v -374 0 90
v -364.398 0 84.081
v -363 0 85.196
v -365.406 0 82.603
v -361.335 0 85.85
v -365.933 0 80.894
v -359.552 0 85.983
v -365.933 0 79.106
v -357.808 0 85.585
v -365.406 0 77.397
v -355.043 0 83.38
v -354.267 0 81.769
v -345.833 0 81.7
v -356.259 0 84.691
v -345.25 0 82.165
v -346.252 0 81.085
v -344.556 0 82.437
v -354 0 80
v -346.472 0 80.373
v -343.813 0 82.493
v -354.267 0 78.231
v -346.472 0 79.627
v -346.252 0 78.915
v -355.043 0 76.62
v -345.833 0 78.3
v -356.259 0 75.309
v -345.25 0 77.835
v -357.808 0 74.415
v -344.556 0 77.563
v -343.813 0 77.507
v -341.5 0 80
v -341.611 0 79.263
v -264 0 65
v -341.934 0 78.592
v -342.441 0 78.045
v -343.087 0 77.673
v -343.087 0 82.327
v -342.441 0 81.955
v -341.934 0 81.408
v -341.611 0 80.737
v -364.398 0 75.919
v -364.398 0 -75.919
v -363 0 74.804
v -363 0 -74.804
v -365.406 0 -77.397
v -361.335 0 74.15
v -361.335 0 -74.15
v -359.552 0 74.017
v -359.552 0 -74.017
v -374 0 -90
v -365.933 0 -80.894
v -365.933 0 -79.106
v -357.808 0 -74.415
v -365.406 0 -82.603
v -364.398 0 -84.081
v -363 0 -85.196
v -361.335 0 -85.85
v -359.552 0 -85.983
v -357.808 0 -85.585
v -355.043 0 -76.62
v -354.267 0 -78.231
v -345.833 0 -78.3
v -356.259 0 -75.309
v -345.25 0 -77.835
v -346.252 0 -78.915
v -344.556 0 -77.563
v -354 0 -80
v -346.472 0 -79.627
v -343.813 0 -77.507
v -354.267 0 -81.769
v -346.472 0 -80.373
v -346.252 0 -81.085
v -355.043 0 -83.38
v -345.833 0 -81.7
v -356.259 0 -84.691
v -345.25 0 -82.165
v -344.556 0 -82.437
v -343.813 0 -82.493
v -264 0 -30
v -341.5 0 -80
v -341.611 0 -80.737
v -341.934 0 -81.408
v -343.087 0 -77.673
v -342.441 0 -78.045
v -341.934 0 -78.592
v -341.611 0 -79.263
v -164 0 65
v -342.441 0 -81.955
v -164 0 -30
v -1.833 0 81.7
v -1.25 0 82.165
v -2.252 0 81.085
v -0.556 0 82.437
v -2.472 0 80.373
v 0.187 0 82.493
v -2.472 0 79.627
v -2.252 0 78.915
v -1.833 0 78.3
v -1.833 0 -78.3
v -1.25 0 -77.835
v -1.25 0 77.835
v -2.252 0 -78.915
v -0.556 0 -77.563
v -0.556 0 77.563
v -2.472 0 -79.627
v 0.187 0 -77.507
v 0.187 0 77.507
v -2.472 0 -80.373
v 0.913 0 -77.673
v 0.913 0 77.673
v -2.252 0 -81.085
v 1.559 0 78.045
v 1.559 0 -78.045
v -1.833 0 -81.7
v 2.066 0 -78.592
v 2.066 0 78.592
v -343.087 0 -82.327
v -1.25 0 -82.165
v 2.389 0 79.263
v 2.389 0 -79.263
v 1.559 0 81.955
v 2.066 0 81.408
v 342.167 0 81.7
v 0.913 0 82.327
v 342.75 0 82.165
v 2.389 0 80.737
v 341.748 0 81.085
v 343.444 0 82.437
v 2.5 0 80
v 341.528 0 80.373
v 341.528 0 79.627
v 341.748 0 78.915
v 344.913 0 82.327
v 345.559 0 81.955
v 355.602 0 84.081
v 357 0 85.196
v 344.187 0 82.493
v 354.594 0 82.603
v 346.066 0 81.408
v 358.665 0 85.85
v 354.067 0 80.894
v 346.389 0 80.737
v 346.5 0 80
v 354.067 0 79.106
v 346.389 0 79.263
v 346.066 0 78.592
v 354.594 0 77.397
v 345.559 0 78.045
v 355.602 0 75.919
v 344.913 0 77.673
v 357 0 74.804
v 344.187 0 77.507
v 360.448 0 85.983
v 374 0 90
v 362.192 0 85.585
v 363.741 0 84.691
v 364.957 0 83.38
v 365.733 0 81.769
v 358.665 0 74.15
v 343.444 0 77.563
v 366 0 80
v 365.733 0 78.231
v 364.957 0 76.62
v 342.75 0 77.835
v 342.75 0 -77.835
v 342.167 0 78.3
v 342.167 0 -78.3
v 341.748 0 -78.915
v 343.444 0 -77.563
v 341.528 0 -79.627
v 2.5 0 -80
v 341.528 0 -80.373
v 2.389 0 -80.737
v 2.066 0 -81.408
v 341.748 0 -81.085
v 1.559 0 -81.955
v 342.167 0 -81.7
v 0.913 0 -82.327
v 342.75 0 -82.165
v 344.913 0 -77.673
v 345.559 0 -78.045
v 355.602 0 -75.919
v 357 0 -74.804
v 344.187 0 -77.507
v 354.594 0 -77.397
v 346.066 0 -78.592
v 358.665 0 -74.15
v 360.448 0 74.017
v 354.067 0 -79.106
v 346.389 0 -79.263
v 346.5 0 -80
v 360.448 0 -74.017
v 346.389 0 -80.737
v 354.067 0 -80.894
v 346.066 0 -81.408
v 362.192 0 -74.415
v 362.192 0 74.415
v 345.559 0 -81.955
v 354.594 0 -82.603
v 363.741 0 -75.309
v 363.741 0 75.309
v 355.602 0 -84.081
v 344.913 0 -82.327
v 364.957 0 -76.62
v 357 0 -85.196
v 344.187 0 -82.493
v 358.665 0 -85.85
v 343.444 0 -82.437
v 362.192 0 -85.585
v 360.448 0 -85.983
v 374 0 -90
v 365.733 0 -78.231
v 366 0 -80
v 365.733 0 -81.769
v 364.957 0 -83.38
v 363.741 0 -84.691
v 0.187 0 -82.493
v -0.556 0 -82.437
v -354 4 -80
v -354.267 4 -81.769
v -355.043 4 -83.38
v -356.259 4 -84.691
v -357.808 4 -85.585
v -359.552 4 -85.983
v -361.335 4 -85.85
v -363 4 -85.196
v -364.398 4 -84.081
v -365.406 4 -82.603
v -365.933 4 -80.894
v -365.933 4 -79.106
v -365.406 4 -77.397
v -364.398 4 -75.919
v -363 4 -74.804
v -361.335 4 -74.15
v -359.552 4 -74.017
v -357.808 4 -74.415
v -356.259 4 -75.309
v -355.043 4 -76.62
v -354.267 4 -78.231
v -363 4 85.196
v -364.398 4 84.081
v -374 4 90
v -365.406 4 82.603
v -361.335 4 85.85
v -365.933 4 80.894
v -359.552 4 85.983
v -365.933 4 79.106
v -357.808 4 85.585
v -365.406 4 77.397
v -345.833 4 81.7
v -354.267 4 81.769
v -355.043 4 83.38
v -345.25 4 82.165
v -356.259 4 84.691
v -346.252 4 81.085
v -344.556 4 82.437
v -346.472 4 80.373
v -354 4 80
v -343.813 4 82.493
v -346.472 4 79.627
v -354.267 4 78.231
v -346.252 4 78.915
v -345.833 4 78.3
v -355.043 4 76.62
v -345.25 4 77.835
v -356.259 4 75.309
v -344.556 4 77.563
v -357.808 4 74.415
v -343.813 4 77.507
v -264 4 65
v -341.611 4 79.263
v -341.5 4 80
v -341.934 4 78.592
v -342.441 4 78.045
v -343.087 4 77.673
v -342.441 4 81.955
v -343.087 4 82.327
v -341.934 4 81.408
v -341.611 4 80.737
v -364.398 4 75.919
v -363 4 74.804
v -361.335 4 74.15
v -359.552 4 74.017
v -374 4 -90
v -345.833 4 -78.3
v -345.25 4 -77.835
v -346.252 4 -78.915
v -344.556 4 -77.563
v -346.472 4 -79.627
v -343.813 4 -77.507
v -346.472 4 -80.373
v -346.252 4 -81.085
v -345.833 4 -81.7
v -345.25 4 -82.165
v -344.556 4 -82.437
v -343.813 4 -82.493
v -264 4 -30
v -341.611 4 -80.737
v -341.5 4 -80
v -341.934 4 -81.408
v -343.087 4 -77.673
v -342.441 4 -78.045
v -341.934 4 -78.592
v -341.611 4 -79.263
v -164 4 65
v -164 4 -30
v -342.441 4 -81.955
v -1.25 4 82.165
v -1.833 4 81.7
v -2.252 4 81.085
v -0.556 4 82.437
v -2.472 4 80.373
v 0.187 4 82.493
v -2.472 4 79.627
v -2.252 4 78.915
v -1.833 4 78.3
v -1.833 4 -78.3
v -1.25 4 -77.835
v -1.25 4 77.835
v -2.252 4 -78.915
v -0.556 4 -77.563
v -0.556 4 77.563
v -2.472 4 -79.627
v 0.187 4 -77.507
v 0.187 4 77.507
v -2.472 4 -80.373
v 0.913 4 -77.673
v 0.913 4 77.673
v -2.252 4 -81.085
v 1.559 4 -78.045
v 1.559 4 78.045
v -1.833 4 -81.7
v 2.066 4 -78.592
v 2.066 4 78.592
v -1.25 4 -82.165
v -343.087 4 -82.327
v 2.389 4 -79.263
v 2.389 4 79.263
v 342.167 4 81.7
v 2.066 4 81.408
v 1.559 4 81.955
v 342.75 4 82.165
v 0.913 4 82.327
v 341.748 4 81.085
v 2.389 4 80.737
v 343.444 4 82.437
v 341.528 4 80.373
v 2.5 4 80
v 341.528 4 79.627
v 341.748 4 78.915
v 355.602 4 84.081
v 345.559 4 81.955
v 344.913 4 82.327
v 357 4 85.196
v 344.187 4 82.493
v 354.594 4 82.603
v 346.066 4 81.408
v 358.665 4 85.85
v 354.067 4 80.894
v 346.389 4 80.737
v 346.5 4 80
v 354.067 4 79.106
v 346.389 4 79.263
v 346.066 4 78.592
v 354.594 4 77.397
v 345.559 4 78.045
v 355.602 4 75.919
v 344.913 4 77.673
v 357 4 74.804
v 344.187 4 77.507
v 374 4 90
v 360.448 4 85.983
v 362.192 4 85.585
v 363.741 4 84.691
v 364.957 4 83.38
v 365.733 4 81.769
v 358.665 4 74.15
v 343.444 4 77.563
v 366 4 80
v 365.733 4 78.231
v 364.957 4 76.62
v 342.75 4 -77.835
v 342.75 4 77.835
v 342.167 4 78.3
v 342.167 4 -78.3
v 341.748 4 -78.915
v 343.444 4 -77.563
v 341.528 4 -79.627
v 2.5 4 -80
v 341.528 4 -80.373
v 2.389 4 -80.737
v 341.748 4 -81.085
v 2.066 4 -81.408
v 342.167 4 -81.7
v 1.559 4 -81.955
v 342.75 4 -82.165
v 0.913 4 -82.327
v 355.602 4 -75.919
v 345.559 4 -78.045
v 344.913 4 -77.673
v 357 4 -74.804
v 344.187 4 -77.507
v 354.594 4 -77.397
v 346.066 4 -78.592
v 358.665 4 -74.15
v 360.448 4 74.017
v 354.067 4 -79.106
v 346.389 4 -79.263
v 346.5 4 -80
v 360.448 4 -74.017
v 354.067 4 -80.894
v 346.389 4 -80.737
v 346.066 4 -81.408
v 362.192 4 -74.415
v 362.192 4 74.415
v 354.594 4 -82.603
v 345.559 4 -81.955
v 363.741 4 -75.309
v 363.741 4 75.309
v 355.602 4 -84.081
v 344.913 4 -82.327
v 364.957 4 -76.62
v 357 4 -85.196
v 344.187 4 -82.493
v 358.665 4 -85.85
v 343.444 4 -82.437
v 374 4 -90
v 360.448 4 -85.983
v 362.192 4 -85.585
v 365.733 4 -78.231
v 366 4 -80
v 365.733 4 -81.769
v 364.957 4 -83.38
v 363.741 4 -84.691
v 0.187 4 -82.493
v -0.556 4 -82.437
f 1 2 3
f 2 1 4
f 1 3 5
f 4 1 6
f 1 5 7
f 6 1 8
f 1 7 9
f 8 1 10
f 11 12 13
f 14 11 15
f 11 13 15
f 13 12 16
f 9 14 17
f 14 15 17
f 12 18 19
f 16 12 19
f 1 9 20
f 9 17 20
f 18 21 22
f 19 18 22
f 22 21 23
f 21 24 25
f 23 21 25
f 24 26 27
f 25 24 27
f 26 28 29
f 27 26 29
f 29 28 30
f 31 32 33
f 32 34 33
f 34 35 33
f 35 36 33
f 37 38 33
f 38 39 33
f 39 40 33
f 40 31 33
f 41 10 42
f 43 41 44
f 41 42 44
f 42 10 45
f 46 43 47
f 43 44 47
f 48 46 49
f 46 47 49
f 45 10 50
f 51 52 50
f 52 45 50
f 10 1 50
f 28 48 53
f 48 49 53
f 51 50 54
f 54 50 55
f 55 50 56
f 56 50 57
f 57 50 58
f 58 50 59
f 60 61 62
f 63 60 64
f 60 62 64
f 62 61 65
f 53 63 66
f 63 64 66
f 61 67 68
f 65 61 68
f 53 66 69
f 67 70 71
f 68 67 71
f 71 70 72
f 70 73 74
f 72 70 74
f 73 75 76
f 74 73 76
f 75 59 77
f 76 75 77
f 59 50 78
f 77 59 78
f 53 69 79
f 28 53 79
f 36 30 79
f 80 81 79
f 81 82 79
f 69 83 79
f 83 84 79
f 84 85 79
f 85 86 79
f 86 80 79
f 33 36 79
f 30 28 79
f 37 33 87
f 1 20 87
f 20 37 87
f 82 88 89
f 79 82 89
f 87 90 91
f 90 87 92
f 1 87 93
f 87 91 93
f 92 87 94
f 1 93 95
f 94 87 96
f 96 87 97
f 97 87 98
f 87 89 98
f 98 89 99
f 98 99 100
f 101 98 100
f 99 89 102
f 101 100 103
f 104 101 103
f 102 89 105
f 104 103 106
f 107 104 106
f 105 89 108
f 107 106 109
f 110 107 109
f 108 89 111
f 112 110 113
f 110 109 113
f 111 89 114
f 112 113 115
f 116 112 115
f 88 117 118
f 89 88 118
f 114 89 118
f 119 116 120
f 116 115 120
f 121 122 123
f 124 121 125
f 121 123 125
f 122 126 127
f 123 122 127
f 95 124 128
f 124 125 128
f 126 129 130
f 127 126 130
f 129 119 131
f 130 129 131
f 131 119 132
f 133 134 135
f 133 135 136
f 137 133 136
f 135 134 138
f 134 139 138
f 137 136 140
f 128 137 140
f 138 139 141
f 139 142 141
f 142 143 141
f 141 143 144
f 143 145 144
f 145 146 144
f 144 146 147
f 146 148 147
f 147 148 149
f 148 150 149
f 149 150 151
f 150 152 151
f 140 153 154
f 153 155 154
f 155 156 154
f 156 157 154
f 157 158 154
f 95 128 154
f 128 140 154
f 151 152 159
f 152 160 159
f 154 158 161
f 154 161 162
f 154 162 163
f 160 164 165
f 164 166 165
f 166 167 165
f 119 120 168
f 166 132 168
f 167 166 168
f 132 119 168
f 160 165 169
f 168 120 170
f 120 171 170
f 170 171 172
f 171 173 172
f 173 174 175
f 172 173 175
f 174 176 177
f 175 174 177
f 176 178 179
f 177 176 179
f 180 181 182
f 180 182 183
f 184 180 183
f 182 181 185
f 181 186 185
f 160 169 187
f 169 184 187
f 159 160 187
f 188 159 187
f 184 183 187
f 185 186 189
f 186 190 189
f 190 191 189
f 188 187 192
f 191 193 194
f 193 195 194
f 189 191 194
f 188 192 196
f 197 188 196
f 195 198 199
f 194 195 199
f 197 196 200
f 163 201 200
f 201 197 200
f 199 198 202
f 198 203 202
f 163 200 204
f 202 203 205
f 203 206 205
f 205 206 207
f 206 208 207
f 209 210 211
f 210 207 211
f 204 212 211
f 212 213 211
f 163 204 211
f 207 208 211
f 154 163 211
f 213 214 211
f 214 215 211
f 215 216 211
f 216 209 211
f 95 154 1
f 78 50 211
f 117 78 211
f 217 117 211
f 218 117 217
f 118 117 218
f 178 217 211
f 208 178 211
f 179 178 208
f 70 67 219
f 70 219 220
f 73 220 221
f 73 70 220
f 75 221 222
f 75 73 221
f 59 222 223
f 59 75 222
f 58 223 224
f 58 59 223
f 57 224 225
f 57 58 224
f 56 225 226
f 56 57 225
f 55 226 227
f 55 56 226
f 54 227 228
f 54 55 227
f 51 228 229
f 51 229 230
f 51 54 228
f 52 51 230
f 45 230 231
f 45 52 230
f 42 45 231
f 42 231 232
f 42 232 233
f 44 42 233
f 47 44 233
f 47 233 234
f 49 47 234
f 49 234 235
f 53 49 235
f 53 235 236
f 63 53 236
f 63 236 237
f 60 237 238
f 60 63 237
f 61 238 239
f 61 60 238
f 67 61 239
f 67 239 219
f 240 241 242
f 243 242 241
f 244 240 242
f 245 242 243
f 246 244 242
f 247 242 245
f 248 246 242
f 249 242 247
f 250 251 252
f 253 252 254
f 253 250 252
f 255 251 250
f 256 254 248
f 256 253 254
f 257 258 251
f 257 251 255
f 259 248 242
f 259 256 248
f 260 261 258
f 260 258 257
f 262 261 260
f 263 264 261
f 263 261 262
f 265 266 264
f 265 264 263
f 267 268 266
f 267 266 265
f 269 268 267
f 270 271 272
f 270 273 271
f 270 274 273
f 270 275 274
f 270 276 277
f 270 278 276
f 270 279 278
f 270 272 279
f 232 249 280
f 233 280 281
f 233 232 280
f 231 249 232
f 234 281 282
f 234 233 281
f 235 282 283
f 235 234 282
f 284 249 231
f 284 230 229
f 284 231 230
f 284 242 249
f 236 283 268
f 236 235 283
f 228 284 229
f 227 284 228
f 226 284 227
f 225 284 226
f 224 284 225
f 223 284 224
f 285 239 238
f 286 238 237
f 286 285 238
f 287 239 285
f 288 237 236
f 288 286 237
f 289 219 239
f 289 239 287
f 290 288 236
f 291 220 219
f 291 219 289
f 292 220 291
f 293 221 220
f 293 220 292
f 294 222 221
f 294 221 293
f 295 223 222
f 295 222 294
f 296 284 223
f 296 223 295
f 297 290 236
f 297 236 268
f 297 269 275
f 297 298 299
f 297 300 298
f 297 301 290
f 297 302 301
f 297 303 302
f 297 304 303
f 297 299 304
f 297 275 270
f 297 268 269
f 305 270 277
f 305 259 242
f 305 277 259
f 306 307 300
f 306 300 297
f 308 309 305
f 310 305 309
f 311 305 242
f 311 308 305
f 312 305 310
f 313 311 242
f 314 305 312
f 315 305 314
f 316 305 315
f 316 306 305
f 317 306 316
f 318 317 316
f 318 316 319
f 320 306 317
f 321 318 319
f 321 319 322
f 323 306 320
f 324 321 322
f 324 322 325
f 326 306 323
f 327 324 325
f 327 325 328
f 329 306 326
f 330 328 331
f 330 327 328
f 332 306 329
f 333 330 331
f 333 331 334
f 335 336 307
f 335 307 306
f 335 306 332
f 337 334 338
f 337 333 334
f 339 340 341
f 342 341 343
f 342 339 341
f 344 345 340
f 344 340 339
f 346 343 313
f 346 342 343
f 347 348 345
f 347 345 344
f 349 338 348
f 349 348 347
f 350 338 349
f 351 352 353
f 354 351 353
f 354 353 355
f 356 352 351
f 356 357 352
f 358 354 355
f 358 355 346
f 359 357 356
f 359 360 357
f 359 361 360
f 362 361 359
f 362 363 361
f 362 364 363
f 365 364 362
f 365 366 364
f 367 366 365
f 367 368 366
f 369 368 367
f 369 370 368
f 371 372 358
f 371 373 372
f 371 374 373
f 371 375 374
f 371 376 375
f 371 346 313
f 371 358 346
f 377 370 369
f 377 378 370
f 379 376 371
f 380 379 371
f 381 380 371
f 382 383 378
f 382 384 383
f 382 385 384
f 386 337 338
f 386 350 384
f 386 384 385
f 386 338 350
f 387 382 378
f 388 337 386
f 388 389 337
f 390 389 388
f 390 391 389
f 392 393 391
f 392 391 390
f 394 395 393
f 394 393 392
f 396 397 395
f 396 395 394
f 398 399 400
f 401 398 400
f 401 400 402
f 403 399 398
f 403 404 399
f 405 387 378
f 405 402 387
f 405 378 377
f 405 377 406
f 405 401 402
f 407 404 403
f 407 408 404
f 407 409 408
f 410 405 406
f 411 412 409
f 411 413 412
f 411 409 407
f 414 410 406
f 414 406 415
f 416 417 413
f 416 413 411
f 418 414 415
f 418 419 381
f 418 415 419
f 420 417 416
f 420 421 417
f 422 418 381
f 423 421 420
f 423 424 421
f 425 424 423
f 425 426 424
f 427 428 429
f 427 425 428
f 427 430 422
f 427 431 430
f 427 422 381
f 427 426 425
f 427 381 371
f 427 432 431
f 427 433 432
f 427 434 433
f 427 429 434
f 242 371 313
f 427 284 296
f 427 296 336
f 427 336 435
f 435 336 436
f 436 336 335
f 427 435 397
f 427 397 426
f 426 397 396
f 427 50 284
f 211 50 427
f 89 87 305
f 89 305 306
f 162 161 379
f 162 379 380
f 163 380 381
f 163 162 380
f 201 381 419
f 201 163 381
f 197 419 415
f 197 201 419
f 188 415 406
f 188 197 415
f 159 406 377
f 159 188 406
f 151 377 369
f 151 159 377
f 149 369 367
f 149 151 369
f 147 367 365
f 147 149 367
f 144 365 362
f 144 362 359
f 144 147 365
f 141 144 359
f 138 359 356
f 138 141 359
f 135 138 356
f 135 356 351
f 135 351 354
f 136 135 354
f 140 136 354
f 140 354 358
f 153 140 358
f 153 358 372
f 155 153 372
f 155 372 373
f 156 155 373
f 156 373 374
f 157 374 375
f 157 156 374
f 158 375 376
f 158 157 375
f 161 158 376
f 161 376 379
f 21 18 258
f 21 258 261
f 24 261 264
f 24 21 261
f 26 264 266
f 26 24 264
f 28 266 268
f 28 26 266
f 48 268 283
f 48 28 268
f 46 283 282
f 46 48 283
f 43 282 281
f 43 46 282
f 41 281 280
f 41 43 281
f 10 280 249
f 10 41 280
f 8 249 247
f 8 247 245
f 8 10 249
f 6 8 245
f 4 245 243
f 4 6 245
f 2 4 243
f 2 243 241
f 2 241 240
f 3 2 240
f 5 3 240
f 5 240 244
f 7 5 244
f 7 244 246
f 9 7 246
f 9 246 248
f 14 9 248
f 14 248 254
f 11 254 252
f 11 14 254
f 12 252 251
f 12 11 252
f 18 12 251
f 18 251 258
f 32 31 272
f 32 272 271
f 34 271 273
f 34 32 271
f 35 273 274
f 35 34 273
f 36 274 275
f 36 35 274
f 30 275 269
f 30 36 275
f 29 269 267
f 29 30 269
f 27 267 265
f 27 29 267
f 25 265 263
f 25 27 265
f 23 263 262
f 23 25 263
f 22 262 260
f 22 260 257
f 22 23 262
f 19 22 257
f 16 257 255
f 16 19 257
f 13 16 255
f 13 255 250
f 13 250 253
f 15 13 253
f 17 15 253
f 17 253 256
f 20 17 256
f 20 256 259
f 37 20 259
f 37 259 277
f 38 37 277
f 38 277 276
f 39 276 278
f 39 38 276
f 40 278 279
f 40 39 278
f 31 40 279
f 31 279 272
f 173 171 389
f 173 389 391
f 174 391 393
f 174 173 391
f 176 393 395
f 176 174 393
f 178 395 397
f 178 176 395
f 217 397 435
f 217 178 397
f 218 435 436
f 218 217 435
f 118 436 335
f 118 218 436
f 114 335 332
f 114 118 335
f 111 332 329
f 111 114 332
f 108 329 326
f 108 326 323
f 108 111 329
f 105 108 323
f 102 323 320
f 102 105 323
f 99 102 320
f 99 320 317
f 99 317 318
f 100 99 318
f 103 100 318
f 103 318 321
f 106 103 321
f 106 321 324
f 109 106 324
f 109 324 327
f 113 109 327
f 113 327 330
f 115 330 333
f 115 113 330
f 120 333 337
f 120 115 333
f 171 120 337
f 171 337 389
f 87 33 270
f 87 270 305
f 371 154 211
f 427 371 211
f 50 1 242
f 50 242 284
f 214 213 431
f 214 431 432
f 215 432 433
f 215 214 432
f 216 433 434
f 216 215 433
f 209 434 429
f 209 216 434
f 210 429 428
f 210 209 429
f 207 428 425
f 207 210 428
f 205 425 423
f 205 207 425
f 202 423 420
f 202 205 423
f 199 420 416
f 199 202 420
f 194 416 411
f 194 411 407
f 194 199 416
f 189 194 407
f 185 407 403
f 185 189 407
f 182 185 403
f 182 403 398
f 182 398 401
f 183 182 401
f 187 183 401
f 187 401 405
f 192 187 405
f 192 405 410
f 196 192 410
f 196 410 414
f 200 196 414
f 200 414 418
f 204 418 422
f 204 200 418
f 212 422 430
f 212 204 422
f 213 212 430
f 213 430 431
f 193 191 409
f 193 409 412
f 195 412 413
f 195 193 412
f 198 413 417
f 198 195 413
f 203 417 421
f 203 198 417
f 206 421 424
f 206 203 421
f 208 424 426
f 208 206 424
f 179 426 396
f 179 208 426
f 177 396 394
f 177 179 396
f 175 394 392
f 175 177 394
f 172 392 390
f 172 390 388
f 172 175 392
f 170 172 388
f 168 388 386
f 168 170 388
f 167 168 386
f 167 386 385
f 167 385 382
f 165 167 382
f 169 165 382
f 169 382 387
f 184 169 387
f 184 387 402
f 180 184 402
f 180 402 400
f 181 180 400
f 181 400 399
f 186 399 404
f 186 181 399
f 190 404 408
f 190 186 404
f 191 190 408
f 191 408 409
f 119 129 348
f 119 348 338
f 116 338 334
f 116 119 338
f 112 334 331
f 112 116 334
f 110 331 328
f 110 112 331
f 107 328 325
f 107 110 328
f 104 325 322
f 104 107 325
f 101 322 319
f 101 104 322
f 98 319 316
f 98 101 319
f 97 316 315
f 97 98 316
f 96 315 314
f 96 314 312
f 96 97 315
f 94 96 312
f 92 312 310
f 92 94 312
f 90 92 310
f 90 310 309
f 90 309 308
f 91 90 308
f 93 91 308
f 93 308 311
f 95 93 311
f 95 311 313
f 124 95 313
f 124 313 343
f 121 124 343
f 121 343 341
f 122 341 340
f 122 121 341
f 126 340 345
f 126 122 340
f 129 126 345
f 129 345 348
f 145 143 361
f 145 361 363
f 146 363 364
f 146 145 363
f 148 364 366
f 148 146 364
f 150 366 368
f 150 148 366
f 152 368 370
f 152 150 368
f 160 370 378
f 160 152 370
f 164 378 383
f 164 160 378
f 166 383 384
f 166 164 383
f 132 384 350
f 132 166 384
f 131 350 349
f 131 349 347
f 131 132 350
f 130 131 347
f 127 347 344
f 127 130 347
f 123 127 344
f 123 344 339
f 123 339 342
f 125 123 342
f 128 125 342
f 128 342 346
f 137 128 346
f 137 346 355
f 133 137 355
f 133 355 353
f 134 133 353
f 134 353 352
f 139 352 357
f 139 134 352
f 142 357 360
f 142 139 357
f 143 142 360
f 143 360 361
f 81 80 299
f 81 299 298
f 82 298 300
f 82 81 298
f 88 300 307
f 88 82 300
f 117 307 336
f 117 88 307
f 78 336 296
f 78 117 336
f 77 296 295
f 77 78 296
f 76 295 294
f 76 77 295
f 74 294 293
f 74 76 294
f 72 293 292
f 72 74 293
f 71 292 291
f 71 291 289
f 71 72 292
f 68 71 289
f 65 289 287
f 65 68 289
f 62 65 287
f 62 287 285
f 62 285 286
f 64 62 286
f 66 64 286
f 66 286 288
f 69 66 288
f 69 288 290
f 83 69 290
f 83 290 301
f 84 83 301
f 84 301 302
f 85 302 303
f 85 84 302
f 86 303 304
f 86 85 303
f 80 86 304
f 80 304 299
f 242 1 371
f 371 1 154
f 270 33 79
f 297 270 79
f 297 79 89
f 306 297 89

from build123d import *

# Parameters (mm, degrees)
SKETCH1_W           = 748
SKETCH1_H           = 180
SKETCH1_R           = 2.5
SKETCH1_R_2         = 6
SKETCH1_W_2         = 100
SKETCH1_H_2         = 95
BOSS_EXTRUDE1_DEPTH = 4


with BuildPart() as part:
    # Sketch1 → Boss-Extrude1 (new body)
    with BuildSketch(Plane(origin=(0, 0, 0), x_dir=(1, 0, 0), z_dir=(0, 1, 0))):
        Rectangle(SKETCH1_W, SKETCH1_H)
        with Locations((-344, 80)):
            Circle(SKETCH1_R, mode=Mode.SUBTRACT)
        with Locations((0, 80)):
            Circle(SKETCH1_R, mode=Mode.SUBTRACT)
        with Locations((344, 80)):
            Circle(SKETCH1_R, mode=Mode.SUBTRACT)
        with Locations((-344, -80)):
            Circle(SKETCH1_R, mode=Mode.SUBTRACT)
        with Locations((0, -80)):
            Circle(SKETCH1_R, mode=Mode.SUBTRACT)
        with Locations((344, -80)):
            Circle(SKETCH1_R, mode=Mode.SUBTRACT)
        with Locations((-360, 80)):
            Circle(SKETCH1_R_2, mode=Mode.SUBTRACT)
        with Locations((-360, -80)):
            Circle(SKETCH1_R_2, mode=Mode.SUBTRACT)
        with Locations((360, -80)):
            Circle(SKETCH1_R_2, mode=Mode.SUBTRACT)
        with Locations((360, 80)):
            Circle(SKETCH1_R_2, mode=Mode.SUBTRACT)
        with Locations((-214, -17.5)):
            Rectangle(SKETCH1_W_2, SKETCH1_H_2, mode=Mode.SUBTRACT)
    extrude(amount=BOSS_EXTRUDE1_DEPTH)


solid = part.part
